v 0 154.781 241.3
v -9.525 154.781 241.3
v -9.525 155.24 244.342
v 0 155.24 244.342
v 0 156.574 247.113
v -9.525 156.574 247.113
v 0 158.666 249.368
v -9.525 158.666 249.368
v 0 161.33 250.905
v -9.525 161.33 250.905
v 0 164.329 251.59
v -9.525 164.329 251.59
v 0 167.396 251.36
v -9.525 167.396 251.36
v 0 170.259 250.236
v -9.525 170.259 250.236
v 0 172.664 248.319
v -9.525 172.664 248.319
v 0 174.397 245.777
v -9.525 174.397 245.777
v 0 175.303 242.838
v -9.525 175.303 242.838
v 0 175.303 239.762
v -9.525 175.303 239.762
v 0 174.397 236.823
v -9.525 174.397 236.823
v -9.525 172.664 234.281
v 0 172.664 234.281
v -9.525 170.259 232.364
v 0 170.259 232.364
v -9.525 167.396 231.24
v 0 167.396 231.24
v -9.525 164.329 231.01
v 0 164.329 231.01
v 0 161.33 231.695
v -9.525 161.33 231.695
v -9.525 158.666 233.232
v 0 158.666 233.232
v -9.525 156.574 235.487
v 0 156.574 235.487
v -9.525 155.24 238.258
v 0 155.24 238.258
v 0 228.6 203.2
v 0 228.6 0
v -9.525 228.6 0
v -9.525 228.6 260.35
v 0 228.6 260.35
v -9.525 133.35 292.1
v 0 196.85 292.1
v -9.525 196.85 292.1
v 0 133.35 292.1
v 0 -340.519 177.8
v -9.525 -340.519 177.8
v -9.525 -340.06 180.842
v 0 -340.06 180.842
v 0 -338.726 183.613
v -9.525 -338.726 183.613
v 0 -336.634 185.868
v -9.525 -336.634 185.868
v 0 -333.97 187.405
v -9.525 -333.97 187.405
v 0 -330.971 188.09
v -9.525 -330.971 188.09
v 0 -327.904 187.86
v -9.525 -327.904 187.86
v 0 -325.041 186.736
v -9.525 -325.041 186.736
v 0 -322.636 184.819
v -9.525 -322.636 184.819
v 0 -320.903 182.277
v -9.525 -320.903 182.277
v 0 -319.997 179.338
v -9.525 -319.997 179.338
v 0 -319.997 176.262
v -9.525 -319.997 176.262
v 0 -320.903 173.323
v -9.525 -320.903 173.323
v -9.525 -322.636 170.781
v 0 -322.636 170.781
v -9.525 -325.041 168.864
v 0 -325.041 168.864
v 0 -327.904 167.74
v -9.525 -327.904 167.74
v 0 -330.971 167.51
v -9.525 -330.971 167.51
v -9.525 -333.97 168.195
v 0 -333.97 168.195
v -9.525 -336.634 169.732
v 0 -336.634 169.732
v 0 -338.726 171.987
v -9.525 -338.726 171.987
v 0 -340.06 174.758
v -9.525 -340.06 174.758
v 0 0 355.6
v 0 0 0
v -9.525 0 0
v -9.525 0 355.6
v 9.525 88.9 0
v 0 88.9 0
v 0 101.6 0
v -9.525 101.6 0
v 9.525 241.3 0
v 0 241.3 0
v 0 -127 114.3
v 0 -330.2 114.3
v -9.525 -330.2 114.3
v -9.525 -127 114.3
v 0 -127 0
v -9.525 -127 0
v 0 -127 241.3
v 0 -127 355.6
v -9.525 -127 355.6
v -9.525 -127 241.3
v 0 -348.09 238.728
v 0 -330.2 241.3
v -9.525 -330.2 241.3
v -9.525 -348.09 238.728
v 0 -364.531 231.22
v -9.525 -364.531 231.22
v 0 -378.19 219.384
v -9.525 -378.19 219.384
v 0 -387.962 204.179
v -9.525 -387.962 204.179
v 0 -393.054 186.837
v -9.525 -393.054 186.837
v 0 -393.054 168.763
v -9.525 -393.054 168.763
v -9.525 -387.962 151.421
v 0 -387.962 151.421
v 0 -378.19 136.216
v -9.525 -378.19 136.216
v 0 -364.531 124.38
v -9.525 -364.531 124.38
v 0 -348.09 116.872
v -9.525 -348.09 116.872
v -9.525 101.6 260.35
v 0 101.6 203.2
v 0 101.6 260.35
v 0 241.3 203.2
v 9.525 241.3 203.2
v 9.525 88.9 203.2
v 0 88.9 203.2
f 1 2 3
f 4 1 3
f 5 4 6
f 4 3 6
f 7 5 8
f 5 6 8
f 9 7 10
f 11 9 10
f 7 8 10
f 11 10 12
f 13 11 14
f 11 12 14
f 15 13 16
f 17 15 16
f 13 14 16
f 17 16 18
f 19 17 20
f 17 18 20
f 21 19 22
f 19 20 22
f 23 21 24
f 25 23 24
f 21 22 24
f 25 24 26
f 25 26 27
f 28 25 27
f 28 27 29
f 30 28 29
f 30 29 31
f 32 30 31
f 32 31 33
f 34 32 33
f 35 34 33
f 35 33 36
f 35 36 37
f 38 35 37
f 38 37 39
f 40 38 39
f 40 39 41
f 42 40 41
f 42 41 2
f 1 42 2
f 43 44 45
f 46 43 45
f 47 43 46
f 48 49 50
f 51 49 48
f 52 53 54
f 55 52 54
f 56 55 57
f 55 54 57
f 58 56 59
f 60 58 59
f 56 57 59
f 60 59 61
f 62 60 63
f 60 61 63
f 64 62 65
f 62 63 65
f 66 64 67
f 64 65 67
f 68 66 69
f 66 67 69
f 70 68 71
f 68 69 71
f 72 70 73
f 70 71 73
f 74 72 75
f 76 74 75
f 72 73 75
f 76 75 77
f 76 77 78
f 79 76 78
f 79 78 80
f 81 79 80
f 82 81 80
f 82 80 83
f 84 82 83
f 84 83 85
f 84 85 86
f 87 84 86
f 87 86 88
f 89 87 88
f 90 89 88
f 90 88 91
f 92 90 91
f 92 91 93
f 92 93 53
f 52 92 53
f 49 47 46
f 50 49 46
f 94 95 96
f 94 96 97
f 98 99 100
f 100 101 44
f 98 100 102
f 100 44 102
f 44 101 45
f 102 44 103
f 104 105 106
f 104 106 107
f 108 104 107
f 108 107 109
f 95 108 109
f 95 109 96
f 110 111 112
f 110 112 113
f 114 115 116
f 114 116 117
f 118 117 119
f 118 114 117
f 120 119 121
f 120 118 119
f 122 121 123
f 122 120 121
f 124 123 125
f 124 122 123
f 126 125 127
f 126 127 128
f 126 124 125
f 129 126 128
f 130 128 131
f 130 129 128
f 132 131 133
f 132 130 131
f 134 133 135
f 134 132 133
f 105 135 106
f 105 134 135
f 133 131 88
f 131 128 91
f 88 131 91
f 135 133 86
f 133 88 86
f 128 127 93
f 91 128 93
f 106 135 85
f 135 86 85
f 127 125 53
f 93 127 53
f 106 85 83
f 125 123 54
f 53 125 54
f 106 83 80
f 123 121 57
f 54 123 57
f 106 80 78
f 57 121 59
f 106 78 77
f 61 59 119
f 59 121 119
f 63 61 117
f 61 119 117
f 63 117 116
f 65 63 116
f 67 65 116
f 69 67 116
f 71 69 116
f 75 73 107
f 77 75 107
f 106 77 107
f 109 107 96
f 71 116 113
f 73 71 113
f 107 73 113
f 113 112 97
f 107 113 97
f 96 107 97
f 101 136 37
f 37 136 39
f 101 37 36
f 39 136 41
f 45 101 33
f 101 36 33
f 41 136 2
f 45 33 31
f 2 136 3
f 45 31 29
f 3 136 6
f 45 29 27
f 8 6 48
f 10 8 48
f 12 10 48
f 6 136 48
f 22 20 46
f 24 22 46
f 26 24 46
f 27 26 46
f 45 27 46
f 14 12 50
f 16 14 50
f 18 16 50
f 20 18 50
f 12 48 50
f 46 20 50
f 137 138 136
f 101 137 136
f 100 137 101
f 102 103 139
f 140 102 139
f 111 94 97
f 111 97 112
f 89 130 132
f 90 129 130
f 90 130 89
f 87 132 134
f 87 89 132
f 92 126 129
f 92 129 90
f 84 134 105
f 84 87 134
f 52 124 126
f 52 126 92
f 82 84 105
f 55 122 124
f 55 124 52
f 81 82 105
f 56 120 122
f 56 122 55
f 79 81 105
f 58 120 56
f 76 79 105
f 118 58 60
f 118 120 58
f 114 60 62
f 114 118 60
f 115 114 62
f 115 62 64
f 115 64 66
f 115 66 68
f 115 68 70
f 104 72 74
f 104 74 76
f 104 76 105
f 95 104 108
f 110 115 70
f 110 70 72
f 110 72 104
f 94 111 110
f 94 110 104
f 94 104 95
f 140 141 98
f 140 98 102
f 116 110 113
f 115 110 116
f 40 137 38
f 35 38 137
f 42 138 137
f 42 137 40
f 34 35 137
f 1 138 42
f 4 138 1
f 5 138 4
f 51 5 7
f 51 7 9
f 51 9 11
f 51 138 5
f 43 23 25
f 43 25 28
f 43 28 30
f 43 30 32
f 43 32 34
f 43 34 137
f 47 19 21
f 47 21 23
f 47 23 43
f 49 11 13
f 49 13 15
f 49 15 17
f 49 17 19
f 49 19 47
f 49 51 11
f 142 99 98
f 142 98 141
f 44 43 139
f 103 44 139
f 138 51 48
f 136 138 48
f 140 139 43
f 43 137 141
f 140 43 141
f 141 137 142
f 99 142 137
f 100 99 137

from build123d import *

# Parameters (mm, degrees)
F1_DEPTH = 9.525
F2_SIZE  = 31.75
F3_D     = 20.6375
F4_W     = 12.7
F4_H     = 203.2
F4_W_2   = 63.5
F5_DEPTH = 9.525
F7_DEPTH = 9.525
F8_D     = 20.6375


with BuildPart() as f1:
    # F0 (on Right) → F1 (new body)
    with BuildSketch(Plane.YZ):
        Polygon((101.6, 292.1), (101.6, 0), (165.1, 0), (228.6, 0), (228.6, 292.1), align=None)
    extrude(amount=-F1_DEPTH)

    # F2
    f2_edges = [f1.edges().sort_by_distance(p)[0] for p in [
        (-4.7625, 101.6, 292.1),
        (-4.7625, 228.6, 292.1),
    ]]
    chamfer(f2_edges, length=F2_SIZE)

    # F3 (through all)
    with Locations(Plane.YZ):
        with Locations((165.1, 241.3)):
            Hole(F3_D / 2)

    # F4 (on face) → F5 (join)
    with BuildSketch(Plane.YZ):
        with Locations((95.25, 101.6)):
            Rectangle(F4_W, F4_H)
        with Locations((133.35, 101.6)):
            Rectangle(F4_W_2, F4_H)
        with Locations((196.85, 101.6)):
            Rectangle(F4_W_2, F4_H)
        with Locations((234.95, 101.6)):
            Rectangle(F4_W, F4_H)
    extrude(amount=F5_DEPTH)


with BuildPart() as f7:
    # F6 (on Right) → F7 (new body)
    with BuildSketch(Plane.YZ):
        with BuildLine():
            Line((-127, 0), (0, 0))
            Line((0, 0), (0, 355.6))
            Line((0, 355.6), (-127, 355.6))
            Line((-127, 355.6), (-127, 241.3))
            Line((-127, 241.3), (-330.2, 241.3))
            ThreePointArc((-330.2, 241.3), (-393.7, 177.8), (-330.2, 114.3))
            Line((-330.2, 114.3), (-127, 114.3))
            Line((-127, 114.3), (-127, 0))
        make_face()
    extrude(amount=-F7_DEPTH)

    # F8 (through all)
    with Locations(Plane.YZ):
        with Locations((-330.2, 177.8)):
            Hole(F8_D / 2)


solid = Compound([f1.part, f7.part])
